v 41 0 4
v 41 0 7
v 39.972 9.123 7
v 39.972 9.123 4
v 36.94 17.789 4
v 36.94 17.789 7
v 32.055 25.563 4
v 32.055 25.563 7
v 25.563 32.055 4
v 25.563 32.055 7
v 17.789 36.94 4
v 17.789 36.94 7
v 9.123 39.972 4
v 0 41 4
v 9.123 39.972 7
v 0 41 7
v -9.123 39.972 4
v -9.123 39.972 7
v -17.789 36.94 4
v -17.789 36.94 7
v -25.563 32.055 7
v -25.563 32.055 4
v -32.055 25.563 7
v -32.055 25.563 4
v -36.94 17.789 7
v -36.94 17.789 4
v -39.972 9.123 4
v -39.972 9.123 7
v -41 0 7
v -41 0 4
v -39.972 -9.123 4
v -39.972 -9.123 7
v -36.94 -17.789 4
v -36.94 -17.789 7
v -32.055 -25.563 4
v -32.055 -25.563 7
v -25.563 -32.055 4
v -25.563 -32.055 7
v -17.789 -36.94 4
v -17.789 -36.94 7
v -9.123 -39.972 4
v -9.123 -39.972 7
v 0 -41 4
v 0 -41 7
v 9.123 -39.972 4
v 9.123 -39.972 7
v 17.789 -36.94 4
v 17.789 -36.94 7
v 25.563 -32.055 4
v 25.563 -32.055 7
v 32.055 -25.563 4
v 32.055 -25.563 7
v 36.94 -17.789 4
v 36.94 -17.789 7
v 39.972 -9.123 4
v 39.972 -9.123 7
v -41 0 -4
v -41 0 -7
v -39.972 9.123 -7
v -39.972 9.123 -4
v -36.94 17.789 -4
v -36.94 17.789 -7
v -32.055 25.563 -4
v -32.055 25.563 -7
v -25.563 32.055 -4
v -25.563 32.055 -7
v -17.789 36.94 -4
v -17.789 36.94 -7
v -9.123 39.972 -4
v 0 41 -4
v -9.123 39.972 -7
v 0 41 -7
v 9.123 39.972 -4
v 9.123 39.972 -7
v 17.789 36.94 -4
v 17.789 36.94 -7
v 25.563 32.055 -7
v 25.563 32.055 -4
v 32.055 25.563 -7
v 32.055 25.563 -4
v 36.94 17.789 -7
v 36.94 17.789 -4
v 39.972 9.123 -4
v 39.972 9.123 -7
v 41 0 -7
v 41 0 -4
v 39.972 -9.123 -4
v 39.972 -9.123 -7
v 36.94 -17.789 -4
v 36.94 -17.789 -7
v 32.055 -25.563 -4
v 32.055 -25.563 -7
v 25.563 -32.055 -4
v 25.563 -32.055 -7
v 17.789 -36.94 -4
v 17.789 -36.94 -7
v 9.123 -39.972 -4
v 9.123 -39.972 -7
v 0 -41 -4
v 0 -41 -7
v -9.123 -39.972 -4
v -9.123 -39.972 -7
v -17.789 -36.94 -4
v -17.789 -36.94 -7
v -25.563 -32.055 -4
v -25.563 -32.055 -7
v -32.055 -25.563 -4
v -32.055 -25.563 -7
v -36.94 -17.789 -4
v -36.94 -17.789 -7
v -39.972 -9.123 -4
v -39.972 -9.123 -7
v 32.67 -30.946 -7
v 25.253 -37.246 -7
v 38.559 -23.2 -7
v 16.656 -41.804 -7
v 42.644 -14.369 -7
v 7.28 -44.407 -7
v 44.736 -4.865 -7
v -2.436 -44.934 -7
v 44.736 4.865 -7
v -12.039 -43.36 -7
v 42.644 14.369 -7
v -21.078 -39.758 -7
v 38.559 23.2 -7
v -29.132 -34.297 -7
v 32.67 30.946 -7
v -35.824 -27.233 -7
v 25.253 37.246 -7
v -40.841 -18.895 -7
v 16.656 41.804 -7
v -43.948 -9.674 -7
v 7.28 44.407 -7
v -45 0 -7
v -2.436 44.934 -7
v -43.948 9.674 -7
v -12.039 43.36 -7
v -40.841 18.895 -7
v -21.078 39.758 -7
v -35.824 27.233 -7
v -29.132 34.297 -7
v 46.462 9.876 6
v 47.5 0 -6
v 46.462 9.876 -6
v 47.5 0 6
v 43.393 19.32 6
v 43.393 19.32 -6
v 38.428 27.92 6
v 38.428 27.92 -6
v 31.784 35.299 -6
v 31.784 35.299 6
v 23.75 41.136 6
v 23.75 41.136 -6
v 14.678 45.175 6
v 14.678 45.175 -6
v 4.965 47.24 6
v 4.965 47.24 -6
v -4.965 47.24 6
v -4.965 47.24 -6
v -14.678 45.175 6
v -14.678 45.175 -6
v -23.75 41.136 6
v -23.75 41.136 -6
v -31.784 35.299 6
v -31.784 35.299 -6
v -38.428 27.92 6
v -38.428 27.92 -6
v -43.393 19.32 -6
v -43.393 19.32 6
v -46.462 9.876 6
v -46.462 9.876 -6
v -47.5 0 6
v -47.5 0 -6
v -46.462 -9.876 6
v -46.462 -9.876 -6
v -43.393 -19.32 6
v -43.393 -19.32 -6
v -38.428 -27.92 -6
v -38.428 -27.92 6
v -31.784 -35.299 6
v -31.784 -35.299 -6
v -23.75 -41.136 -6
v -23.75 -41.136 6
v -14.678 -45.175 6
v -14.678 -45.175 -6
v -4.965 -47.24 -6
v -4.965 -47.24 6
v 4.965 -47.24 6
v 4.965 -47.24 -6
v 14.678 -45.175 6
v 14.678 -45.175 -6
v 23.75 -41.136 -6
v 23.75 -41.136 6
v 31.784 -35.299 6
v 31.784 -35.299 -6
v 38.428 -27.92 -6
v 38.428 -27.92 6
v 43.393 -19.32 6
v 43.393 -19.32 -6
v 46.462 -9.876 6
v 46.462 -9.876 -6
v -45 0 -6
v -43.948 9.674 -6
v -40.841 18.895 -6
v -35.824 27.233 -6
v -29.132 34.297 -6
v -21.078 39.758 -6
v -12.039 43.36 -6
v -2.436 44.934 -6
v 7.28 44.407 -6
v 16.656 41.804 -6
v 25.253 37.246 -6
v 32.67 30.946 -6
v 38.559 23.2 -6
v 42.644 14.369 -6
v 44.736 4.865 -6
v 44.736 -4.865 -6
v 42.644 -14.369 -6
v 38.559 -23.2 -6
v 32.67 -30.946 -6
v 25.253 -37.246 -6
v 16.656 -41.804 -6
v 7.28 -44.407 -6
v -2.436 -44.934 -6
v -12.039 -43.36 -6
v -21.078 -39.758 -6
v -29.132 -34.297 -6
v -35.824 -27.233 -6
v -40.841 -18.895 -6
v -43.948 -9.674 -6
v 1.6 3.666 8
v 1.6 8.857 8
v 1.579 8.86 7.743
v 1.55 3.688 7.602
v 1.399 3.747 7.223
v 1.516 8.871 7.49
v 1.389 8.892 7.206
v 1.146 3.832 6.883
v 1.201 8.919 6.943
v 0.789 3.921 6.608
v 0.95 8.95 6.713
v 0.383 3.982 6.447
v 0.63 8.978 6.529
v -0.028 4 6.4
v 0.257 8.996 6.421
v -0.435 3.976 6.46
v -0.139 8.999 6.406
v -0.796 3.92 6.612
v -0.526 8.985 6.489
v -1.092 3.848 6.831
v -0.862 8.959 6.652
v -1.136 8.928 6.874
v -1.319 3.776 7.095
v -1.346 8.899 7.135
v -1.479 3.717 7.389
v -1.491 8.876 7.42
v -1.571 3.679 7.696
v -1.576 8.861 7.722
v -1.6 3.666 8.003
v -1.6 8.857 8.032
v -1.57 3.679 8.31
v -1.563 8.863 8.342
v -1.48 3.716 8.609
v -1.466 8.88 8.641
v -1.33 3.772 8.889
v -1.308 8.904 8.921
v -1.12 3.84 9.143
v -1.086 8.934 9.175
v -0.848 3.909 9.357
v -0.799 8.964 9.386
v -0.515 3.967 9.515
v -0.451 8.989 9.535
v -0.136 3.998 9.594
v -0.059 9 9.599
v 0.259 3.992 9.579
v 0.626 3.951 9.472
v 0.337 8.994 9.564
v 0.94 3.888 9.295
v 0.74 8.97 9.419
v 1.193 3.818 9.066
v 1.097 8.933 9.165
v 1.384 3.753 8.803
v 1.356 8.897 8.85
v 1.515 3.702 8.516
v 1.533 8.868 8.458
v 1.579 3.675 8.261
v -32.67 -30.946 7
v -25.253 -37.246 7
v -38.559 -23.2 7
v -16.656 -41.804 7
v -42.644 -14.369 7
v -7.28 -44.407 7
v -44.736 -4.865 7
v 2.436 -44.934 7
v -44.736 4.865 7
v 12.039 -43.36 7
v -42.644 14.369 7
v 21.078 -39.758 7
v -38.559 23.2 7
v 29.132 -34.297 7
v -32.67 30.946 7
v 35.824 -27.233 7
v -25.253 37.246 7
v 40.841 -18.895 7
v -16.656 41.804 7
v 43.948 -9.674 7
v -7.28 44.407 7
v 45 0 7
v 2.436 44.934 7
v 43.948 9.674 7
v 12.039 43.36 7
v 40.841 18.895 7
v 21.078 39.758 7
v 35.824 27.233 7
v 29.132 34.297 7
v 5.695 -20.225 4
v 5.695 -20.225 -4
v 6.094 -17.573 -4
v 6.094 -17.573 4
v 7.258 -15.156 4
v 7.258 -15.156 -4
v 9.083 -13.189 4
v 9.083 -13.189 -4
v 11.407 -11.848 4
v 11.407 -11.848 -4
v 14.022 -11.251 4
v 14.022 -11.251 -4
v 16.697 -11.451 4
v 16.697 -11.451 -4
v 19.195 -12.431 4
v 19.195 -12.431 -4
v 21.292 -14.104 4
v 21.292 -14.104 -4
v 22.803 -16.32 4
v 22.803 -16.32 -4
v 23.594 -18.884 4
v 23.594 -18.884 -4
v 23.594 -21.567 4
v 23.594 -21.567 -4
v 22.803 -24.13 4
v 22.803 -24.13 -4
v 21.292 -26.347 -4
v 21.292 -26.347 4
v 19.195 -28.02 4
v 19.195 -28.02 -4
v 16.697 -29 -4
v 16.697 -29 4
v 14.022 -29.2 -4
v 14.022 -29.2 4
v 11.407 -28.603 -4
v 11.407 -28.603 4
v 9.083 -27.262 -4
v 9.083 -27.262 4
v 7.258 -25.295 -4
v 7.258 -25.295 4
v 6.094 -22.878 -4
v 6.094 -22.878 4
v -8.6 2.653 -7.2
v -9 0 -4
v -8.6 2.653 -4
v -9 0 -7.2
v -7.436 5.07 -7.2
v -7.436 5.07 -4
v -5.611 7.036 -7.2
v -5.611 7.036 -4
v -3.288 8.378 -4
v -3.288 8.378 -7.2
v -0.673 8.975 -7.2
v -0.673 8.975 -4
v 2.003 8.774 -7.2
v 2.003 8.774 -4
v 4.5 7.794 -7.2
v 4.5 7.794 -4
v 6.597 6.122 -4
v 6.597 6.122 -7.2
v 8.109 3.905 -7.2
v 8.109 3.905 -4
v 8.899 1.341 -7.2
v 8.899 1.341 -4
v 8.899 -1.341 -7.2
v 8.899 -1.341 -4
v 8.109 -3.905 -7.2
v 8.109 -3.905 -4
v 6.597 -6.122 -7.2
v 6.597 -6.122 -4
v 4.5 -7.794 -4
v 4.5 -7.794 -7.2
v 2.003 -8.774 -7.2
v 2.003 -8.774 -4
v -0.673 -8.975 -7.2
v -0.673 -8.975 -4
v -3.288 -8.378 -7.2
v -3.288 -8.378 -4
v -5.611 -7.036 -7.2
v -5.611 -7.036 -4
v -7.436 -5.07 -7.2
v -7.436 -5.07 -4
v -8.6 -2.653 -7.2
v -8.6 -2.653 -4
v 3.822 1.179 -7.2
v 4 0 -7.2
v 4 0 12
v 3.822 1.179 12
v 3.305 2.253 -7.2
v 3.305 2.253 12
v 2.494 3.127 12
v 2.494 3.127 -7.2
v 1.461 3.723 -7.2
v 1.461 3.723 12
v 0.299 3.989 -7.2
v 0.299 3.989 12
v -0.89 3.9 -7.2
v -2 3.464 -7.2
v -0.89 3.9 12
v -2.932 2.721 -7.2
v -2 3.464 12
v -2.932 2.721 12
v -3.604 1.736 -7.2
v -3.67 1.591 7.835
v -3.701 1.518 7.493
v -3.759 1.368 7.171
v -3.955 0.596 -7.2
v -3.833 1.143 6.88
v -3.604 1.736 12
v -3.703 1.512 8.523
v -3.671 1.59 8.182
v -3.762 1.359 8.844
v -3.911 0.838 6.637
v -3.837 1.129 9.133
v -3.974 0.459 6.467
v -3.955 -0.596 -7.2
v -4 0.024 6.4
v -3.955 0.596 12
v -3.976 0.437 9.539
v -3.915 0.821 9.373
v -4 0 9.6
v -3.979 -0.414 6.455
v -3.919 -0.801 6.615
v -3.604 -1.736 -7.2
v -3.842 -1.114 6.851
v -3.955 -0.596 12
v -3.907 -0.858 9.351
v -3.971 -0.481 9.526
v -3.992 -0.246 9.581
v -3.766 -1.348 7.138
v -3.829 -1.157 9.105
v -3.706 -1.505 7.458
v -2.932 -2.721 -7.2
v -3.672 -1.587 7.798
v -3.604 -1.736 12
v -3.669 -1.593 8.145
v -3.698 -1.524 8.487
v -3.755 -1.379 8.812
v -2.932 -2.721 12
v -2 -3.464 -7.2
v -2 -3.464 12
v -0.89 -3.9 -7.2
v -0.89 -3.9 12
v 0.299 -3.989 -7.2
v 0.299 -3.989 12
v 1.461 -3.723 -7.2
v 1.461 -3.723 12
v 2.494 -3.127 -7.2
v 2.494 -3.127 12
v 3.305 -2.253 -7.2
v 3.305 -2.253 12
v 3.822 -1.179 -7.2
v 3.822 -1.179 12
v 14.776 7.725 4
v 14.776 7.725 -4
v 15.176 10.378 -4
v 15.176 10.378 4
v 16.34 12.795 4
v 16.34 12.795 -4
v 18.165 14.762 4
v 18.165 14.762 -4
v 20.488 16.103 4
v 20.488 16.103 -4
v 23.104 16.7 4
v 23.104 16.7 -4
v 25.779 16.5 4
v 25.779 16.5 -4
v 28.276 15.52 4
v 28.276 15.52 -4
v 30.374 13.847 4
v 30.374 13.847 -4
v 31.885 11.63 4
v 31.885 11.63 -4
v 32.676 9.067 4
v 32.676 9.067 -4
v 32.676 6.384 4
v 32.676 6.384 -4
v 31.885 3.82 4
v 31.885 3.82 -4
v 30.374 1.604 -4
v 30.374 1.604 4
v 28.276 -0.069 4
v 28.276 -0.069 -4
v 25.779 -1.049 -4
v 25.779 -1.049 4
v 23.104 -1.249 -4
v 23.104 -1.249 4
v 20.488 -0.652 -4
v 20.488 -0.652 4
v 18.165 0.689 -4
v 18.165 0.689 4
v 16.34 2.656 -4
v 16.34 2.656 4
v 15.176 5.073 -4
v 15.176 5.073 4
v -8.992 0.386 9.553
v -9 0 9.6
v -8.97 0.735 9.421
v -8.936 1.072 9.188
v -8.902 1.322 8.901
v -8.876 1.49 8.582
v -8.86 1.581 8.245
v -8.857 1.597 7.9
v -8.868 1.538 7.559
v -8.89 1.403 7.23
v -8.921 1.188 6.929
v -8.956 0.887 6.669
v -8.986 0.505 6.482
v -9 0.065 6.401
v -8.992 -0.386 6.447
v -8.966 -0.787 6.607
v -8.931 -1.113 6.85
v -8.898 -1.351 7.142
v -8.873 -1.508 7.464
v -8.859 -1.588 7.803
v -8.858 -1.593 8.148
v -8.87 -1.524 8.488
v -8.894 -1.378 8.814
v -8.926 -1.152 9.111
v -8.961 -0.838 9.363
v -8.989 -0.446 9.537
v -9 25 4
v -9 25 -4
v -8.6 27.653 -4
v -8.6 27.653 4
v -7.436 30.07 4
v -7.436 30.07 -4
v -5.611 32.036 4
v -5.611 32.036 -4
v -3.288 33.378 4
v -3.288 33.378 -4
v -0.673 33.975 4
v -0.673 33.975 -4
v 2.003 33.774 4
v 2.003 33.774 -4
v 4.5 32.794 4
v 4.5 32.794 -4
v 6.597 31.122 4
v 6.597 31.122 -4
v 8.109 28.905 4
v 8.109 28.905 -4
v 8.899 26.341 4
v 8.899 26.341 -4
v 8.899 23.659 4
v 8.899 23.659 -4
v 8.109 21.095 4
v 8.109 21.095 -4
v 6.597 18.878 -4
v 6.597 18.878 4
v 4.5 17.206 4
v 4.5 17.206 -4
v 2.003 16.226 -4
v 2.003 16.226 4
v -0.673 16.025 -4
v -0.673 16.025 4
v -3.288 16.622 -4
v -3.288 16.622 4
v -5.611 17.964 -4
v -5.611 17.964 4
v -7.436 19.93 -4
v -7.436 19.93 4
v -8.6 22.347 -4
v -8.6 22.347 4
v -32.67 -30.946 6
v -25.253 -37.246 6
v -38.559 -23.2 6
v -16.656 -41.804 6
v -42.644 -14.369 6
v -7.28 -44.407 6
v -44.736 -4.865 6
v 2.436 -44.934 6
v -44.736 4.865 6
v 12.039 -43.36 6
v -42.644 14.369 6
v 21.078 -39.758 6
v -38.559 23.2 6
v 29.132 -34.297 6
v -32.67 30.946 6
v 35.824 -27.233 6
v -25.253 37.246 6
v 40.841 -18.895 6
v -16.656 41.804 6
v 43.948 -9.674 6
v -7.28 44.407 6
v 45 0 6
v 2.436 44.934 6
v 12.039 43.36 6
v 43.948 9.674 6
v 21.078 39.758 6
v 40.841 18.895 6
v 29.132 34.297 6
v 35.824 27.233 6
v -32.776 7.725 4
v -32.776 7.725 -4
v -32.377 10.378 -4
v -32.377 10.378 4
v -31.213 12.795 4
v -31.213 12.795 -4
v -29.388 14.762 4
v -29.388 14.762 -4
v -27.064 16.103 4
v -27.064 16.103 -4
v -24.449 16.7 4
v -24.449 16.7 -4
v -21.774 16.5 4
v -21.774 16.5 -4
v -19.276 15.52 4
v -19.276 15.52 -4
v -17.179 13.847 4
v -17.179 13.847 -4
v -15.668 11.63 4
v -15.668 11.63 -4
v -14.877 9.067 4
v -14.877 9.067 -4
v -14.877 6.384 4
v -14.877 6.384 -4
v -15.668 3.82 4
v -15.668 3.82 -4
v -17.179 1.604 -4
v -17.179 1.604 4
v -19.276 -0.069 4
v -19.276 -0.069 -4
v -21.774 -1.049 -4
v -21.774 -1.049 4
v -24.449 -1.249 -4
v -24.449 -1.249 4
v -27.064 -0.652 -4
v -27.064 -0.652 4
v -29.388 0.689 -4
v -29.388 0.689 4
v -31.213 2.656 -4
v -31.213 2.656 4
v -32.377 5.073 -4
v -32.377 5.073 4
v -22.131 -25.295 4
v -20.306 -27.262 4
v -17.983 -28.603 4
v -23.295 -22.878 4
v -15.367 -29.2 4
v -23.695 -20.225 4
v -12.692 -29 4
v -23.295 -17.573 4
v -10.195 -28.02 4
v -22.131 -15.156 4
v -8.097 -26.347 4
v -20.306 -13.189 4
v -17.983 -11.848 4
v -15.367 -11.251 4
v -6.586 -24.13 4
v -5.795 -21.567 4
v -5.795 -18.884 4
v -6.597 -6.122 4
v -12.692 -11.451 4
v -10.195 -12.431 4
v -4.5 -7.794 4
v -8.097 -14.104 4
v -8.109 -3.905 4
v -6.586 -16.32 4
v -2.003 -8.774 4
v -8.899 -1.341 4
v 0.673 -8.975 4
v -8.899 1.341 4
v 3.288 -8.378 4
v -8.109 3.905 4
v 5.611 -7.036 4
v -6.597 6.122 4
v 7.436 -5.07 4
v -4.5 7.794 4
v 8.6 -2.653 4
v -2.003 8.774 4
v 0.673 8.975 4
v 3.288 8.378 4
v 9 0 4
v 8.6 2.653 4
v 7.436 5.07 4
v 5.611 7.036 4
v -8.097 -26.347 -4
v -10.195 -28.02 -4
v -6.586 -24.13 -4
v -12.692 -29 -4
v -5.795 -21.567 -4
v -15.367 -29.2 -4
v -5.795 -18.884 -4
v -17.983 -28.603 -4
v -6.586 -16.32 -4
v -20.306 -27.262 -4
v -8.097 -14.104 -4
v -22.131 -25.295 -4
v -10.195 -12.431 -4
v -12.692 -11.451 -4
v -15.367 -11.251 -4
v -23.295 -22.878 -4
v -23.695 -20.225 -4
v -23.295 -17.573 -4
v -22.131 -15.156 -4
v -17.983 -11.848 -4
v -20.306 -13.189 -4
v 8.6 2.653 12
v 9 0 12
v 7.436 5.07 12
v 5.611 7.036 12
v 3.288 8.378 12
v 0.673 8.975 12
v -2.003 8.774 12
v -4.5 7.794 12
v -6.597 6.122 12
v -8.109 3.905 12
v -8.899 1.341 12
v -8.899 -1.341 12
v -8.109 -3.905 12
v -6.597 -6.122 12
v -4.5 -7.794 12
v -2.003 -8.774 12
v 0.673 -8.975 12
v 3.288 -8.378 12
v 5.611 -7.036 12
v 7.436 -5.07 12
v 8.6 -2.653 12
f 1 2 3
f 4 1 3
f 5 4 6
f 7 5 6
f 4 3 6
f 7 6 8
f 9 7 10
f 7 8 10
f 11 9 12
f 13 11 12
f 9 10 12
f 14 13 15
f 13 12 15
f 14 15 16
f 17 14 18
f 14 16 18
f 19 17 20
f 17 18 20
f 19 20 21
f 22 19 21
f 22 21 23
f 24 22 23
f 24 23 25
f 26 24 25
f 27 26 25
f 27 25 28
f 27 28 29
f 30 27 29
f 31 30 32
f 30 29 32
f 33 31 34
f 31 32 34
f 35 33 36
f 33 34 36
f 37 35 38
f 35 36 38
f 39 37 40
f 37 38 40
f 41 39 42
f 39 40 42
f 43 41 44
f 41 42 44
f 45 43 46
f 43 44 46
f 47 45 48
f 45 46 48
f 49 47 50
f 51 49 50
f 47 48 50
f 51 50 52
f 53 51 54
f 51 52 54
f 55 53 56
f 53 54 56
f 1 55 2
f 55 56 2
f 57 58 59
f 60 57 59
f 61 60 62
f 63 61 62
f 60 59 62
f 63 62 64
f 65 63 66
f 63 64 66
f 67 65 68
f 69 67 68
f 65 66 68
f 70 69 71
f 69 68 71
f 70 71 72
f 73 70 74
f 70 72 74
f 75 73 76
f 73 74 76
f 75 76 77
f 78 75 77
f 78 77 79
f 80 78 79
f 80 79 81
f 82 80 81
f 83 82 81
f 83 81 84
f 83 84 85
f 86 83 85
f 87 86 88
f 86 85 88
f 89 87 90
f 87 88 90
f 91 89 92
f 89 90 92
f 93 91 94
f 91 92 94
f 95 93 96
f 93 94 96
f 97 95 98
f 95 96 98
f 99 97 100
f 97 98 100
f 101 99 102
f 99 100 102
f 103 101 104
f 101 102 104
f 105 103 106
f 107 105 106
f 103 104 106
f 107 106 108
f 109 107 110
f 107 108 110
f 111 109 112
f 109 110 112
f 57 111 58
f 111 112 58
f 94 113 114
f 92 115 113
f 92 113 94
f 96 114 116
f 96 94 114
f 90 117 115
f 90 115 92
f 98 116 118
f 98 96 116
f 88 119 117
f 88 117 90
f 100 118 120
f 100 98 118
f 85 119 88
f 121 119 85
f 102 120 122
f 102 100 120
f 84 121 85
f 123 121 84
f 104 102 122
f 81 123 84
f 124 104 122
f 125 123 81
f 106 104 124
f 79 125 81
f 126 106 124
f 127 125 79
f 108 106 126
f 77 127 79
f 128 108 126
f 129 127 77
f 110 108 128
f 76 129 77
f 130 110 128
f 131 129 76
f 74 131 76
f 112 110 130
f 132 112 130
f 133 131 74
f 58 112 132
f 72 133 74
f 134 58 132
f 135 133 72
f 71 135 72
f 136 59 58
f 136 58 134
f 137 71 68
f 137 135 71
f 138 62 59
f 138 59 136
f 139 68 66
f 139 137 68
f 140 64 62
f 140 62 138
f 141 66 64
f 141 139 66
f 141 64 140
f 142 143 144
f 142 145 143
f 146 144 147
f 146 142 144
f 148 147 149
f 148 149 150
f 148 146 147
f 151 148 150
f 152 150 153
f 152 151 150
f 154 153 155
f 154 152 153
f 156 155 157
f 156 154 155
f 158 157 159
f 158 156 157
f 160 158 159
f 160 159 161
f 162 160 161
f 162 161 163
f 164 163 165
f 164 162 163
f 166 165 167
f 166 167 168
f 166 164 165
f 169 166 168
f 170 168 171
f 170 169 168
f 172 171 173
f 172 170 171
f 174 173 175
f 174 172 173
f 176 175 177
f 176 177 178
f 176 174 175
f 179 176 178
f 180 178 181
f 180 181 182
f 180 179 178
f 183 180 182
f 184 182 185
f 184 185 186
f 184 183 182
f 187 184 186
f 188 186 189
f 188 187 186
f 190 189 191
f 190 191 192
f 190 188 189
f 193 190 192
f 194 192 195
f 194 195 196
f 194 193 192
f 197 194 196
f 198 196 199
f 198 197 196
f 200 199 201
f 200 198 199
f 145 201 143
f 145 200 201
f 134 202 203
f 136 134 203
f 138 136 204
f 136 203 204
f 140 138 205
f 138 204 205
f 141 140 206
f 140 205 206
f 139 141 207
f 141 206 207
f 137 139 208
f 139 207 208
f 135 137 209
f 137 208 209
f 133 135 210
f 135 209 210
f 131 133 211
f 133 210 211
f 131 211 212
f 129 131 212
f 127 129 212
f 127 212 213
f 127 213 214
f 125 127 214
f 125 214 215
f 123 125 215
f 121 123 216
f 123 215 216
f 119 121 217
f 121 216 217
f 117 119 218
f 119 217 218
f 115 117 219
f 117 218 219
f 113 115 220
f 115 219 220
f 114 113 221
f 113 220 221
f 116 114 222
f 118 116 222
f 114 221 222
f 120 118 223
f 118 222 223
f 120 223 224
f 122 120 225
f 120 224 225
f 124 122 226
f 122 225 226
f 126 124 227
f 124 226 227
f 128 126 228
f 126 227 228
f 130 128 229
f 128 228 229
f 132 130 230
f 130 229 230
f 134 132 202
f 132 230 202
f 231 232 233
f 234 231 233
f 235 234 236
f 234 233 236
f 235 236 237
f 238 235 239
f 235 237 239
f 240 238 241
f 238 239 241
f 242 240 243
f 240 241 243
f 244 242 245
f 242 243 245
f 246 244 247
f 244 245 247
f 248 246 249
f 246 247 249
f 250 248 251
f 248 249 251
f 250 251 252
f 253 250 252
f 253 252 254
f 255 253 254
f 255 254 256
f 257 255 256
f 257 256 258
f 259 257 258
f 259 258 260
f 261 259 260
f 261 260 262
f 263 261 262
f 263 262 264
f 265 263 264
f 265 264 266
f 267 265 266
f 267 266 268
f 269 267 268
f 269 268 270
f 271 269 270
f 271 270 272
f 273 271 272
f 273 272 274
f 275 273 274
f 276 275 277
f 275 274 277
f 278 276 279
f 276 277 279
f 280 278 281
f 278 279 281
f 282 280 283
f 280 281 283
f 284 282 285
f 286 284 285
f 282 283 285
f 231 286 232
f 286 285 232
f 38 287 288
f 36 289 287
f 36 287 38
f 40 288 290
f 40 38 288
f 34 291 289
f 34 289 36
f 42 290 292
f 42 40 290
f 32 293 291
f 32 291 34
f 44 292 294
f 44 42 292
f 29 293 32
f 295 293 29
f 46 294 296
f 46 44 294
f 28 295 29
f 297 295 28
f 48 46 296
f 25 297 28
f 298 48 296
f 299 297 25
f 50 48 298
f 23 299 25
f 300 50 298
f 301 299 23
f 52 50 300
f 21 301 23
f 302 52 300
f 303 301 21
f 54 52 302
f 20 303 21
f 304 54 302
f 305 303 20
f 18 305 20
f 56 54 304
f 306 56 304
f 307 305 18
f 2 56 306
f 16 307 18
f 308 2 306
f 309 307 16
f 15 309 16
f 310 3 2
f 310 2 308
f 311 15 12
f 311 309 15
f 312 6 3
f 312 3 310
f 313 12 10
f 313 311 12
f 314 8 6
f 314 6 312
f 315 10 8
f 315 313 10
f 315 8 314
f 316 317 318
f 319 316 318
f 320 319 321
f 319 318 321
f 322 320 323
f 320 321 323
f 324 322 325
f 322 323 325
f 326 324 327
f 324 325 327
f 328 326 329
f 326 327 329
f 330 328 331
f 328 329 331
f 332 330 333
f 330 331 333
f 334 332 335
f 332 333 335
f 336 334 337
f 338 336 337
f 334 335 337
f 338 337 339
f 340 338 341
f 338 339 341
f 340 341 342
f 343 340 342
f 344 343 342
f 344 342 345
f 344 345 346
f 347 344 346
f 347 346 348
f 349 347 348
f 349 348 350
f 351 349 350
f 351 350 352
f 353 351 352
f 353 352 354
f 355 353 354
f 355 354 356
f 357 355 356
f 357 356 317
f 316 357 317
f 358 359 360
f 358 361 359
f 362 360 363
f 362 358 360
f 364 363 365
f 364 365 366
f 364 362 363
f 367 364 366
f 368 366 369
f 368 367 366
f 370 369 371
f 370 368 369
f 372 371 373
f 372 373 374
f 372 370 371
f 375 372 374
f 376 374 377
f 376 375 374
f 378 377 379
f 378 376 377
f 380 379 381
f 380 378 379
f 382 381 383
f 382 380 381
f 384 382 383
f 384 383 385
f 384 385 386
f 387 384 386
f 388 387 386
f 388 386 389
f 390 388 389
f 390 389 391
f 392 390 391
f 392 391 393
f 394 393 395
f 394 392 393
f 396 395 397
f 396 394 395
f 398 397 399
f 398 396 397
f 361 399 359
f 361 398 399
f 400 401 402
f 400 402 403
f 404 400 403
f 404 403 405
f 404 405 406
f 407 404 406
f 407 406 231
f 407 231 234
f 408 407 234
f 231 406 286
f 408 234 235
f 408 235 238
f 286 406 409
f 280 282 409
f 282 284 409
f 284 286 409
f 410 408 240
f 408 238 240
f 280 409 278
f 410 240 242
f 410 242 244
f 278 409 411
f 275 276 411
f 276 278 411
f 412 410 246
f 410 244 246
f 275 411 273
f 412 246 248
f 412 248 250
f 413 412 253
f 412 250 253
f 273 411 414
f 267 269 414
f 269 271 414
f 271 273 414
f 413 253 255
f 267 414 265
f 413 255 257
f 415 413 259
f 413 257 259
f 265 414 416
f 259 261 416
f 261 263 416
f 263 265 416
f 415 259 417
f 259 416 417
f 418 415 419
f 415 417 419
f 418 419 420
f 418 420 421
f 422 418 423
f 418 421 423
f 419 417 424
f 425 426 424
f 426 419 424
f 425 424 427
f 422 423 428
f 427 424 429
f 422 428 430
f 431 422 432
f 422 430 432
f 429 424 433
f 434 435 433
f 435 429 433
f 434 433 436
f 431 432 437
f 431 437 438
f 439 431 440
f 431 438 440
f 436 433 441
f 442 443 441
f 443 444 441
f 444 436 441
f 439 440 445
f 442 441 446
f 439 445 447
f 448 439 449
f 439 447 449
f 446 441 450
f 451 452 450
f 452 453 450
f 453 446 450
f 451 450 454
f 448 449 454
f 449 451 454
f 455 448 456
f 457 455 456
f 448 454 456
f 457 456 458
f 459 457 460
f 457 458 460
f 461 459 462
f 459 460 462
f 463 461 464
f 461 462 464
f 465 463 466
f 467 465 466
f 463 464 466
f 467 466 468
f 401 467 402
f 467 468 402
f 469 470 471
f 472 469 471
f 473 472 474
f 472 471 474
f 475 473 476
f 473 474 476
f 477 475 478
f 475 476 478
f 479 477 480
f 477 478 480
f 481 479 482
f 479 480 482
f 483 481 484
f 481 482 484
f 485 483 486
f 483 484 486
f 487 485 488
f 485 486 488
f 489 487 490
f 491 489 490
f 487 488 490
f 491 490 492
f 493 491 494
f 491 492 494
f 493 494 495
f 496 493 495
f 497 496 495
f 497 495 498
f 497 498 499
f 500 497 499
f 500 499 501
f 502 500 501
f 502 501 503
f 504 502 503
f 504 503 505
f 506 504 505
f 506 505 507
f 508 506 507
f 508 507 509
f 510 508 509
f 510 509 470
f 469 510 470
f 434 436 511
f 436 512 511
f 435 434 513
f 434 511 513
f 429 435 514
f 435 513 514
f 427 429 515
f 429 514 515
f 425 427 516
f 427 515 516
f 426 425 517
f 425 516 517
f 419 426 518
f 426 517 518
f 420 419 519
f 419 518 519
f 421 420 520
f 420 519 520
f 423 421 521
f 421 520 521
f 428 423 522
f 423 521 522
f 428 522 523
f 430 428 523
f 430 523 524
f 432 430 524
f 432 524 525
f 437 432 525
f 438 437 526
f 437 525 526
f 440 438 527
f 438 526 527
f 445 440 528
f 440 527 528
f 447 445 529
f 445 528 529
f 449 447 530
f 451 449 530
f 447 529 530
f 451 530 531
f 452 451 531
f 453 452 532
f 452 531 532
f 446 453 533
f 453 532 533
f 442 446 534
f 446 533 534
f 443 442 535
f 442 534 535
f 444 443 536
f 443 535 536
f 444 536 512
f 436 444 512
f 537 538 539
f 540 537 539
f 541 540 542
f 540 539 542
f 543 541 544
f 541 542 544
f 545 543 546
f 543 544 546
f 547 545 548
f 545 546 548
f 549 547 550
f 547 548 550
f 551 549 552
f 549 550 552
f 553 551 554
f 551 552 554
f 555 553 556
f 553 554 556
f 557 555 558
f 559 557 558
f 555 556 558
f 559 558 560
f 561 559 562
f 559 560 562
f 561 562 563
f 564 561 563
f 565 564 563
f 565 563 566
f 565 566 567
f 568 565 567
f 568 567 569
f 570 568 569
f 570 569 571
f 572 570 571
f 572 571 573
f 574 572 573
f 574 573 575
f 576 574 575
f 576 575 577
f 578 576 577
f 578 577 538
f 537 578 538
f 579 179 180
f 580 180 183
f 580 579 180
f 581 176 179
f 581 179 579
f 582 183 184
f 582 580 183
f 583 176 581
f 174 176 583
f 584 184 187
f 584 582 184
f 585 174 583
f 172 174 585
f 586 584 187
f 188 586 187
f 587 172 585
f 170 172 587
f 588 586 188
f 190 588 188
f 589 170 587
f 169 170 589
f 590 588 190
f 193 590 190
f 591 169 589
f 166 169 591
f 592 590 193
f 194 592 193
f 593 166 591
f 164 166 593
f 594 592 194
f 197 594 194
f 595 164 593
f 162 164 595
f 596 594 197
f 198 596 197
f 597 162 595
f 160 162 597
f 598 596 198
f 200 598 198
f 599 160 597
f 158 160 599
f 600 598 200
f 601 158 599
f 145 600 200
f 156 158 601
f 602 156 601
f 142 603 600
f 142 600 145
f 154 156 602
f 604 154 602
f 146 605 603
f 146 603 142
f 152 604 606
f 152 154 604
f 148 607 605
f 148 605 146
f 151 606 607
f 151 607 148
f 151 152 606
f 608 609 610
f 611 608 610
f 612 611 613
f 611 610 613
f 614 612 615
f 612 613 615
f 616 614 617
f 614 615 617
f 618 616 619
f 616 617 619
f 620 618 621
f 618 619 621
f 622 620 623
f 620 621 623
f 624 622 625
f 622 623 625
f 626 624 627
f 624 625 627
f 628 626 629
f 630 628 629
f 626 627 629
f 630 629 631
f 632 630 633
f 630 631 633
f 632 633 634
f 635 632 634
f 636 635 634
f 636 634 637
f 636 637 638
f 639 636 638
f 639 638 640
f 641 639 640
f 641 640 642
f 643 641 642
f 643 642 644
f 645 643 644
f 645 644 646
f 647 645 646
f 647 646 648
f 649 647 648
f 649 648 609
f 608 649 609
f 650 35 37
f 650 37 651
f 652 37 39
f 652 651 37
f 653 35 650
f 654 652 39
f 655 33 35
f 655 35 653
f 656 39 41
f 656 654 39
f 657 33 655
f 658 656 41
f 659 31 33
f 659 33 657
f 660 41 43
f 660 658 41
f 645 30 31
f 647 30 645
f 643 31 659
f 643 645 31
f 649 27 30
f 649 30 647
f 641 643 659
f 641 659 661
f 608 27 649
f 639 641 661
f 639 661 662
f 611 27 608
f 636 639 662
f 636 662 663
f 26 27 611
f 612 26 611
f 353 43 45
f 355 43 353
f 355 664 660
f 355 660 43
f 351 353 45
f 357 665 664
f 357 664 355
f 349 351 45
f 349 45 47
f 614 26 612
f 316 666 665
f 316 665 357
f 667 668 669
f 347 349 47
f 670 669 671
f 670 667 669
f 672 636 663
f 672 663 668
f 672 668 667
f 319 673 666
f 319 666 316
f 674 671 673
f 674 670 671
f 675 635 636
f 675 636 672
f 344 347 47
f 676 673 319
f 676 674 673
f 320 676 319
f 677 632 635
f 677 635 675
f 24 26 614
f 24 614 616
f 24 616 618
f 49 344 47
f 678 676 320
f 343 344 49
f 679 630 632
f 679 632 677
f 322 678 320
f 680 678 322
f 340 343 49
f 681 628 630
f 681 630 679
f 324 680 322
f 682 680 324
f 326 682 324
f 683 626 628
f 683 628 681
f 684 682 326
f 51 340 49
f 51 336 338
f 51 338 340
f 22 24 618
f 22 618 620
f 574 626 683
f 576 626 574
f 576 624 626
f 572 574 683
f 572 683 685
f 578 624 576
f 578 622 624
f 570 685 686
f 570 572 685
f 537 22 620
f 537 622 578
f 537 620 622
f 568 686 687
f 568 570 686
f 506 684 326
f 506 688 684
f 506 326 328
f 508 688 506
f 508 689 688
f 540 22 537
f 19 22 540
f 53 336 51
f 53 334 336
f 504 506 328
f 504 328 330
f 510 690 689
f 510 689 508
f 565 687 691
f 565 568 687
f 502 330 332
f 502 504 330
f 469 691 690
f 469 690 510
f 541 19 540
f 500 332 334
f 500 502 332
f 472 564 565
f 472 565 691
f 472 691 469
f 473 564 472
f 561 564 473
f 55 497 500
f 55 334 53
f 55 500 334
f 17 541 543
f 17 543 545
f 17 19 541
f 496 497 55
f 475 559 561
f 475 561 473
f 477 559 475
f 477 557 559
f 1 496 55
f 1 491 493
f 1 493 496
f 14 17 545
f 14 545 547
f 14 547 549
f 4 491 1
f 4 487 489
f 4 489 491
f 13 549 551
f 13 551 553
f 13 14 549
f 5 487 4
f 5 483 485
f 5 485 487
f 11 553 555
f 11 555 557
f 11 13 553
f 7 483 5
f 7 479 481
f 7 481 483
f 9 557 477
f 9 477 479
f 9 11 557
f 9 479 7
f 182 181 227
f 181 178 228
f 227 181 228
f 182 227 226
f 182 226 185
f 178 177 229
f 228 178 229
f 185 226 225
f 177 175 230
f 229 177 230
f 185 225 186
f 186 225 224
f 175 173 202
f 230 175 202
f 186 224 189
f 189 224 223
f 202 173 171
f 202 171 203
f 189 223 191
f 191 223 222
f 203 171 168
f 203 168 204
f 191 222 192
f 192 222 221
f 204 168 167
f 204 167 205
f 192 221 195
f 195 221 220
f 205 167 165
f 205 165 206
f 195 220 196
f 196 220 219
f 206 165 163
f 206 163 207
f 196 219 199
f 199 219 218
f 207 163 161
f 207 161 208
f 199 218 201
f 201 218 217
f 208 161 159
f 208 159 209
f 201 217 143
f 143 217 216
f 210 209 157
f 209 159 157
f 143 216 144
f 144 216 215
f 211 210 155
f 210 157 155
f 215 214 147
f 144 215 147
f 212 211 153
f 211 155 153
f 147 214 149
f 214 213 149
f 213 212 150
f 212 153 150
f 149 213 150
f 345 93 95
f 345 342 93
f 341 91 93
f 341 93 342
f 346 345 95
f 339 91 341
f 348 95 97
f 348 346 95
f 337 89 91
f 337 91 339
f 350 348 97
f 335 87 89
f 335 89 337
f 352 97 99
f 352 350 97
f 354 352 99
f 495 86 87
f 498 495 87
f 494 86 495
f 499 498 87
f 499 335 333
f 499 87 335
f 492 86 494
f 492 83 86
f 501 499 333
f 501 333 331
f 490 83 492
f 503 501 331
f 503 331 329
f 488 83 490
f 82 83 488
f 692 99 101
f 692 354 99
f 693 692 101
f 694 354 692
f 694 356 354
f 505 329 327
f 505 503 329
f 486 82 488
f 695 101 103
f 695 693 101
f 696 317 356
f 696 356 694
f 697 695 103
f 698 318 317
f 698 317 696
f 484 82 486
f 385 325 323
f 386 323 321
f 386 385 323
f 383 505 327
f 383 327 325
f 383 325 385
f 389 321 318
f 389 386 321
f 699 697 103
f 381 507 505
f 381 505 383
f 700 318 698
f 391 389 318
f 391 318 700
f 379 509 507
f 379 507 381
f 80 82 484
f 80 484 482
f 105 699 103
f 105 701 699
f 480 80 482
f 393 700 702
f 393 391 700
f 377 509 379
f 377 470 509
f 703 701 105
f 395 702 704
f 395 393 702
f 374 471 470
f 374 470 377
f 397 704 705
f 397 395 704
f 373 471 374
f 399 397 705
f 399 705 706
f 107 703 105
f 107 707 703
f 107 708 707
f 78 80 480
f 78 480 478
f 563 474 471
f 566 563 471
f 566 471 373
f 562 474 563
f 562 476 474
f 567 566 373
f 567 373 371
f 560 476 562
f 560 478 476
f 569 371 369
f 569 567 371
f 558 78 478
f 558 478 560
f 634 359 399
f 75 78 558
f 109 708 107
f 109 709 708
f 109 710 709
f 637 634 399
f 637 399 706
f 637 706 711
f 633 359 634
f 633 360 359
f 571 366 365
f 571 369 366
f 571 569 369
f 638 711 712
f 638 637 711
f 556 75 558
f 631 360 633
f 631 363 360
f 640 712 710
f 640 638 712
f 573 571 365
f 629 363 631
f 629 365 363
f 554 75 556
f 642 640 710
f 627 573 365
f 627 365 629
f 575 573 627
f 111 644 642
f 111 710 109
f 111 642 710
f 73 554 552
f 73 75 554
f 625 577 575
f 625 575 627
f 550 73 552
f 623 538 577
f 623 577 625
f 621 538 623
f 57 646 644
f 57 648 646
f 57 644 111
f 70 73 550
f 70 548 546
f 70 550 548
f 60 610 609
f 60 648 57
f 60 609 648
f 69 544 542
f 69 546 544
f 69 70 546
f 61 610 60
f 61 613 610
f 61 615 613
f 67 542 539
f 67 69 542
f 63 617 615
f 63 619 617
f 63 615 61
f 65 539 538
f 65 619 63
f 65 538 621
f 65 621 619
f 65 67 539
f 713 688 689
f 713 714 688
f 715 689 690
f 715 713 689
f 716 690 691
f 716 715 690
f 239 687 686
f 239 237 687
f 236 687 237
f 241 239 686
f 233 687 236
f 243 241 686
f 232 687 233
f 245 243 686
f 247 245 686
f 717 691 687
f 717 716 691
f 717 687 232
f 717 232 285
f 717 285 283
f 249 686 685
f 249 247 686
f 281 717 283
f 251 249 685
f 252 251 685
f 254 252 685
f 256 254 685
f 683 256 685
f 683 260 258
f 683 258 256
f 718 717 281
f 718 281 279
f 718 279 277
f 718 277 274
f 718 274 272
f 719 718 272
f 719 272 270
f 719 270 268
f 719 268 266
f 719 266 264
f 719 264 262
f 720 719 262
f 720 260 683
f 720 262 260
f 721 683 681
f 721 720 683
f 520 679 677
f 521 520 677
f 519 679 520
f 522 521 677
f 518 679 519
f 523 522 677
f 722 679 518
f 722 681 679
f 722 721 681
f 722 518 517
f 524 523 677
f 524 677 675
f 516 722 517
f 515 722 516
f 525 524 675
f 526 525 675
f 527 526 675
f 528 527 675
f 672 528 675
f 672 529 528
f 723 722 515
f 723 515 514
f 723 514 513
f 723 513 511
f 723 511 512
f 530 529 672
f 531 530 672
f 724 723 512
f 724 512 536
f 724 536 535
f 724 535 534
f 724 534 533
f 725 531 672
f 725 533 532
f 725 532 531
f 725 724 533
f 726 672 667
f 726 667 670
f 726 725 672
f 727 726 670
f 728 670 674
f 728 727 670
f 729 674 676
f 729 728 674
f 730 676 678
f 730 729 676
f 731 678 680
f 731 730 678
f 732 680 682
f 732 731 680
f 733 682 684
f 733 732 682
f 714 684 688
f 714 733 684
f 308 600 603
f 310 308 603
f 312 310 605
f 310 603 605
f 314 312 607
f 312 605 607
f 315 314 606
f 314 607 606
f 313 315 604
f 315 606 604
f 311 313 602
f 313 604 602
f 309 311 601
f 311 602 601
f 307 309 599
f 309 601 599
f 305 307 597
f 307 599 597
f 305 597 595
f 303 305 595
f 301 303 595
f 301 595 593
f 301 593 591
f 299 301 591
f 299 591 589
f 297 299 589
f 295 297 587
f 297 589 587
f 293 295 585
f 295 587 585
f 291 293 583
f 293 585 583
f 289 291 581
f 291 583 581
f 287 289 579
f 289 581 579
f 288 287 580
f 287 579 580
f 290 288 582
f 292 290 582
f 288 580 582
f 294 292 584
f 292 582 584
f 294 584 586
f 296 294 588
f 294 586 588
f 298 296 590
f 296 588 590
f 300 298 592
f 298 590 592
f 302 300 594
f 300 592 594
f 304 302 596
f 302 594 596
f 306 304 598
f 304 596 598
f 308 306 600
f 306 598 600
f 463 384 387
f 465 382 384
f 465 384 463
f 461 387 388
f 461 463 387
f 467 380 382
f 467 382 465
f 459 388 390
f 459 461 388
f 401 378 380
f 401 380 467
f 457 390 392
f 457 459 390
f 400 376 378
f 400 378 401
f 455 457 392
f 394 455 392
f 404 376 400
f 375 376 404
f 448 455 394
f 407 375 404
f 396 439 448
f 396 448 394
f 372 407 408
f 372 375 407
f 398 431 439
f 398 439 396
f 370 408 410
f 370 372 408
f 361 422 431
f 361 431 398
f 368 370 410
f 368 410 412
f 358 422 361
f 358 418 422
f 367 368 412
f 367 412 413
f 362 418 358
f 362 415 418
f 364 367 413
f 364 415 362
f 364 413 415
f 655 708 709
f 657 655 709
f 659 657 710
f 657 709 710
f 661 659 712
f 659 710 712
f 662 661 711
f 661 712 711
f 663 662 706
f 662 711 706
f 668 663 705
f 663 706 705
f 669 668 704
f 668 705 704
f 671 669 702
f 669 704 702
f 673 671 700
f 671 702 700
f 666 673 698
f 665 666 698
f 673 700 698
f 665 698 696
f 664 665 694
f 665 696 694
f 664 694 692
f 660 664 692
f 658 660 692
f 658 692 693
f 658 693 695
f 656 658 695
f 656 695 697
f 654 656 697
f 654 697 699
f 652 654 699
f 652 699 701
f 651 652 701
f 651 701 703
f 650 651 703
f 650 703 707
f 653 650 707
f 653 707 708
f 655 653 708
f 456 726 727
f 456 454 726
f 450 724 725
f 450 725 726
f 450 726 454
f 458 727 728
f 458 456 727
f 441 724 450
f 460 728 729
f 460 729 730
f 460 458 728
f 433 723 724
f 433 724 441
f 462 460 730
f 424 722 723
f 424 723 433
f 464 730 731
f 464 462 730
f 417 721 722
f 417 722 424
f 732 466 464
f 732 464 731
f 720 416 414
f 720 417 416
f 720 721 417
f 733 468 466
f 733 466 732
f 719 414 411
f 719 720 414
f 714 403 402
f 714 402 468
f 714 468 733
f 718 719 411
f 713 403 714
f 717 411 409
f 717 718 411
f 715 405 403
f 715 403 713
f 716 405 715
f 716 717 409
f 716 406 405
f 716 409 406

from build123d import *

# Parameters (mm, degrees)
BOSS_EXTRUDE1_DEPTH      = 6
BOSS_EXTRUDE1_DEPTH_BACK = 6
SKETCH1_R                = 47.5
SKETCH2_R                = 45
BOSS_EXTRUDE2_DEPTH      = 1
BOSS_EXTRUDE3_START      = 1
SKETCH3_R                = 45
BOSS_EXTRUDE3_DEPTH      = 1
SKETCH4_R                = 9
BOSS_EXTRUDE4_DEPTH      = 0.2
BOSS_EXTRUDE5_START      = 5
SKETCH5_R                = 9
BOSS_EXTRUDE5_DEPTH      = 5
SKETCH6_R                = 41
SKETCH6_R_2              = 9
CUT_EXTRUDE1_DEPTH       = 3
CUT_EXTRUDE2_START       = -3
SKETCH7_R                = 41
SKETCH7_R_2              = 9
CUT_EXTRUDE2_DEPTH       = 3
SKETCH8_R                = 9
CUT_EXTRUDE3_DEPTH       = 70.054326439
SKETCH9_R                = 4
CUT_EXTRUDE4_DEPTH       = 70.865155836
CUT_EXTRUDE5_REACH       = 76.783
SKETCH10_R               = 1.6
CUT_EXTRUDE6_REACH       = 76.783
SKETCH11_R               = 1.6


with BuildPart() as part:
    # Sketch1 → Boss-Extrude1 (new, two sides: drawn at the far end of the back side and taken through both)
    with BuildSketch(Plane.XY.offset(-BOSS_EXTRUDE1_DEPTH_BACK)):
        Circle(SKETCH1_R)
    extrude(amount=BOSS_EXTRUDE1_DEPTH + BOSS_EXTRUDE1_DEPTH_BACK)

    # Sketch2 → Boss-Extrude2 (add)
    with BuildSketch(Plane.XY.offset(6)):
        Circle(SKETCH2_R)
    extrude(amount=BOSS_EXTRUDE2_DEPTH)

    # Sketch3 → Boss-Extrude3 (add)
    with BuildSketch(Plane(origin=(0, 0, -6), x_dir=(-1, 0, 0), z_dir=(0, 0, -1)).offset(BOSS_EXTRUDE3_START)):
        Circle(SKETCH3_R)
    extrude(amount=-BOSS_EXTRUDE3_DEPTH)

    # Sketch4 → Boss-Extrude4 (add)
    with BuildSketch(Plane(origin=(0, 0, -7), x_dir=(-1, 0, 0), z_dir=(0, 0, -1))):
        Circle(SKETCH4_R)
    extrude(amount=BOSS_EXTRUDE4_DEPTH)

    # Sketch5 → Boss-Extrude5 (add)
    with BuildSketch(Plane.XY.offset(7).offset(BOSS_EXTRUDE5_START)):
        Circle(SKETCH5_R)
    extrude(amount=-BOSS_EXTRUDE5_DEPTH)

    # Sketch6 → Cut-Extrude1 (cut)
    with BuildSketch(Plane.XY.offset(7)):
        Circle(SKETCH6_R)
        Circle(SKETCH6_R_2, mode=Mode.SUBTRACT)
    extrude(amount=-CUT_EXTRUDE1_DEPTH, mode=Mode.SUBTRACT)

    # Sketch7 → Cut-Extrude2 (cut)
    with BuildSketch(Plane(origin=(0, 0, -7), x_dir=(-1, 0, 0), z_dir=(0, 0, -1)).offset(CUT_EXTRUDE2_START)):
        Circle(SKETCH7_R)
        Circle(SKETCH7_R_2, mode=Mode.SUBTRACT)
    extrude(amount=CUT_EXTRUDE2_DEPTH, mode=Mode.SUBTRACT)

    # Sketch8 → Cut-Extrude3 (cut, through all)
    with BuildSketch(Plane(origin=(0, 0, -4), x_dir=(-1, 0, 0), z_dir=(0, 0, -1))):
        with Locations((0, 25)):
            Circle(SKETCH8_R)
        with Locations((23.776412907, 7.725424859)):
            Circle(SKETCH8_R)
        with Locations((14.694631307, -20.225424859)):
            Circle(SKETCH8_R)
        with Locations((-14.694631307, -20.225424859)):
            Circle(SKETCH8_R)
        with Locations((-23.776412907, 7.725424859)):
            Circle(SKETCH8_R)
    extrude(amount=-CUT_EXTRUDE3_DEPTH, mode=Mode.SUBTRACT)

    # Sketch9 → Cut-Extrude4 (cut, through all)
    with BuildSketch(Plane.XY.offset(12)):
        Circle(SKETCH9_R)
    extrude(amount=-CUT_EXTRUDE4_DEPTH, mode=Mode.SUBTRACT)

    # Sketch10 → Cut-Extrude5 (cut, up to next)
    with BuildSketch(Plane.ZY.offset(9), mode=Mode.PRIVATE) as cut_extrude5_sk1:
        with Locations((8, 0)):
            Circle(SKETCH10_R)
    cut_extrude5_tool1 = extrude(cut_extrude5_sk1.sketch, amount=-CUT_EXTRUDE5_REACH, mode=Mode.PRIVATE) & part.part
    add(cut_extrude5_tool1.solids().sort_by_distance((-9, 0, 8))[0], mode=Mode.SUBTRACT)

    # Sketch11 → Cut-Extrude6 (cut, up to next)
    with BuildSketch(Plane(origin=(0, 9, 0), x_dir=(1, 0, 0), z_dir=(0, 1, 0)), mode=Mode.PRIVATE) as cut_extrude6_sk1:
        with Locations((0, -8)):
            Circle(SKETCH11_R)
    cut_extrude6_tool1 = extrude(cut_extrude6_sk1.sketch, amount=-CUT_EXTRUDE6_REACH, mode=Mode.PRIVATE) & part.part
    add(cut_extrude6_tool1.solids().sort_by_distance((0, 9, 8))[0], mode=Mode.SUBTRACT)


solid = part.part
